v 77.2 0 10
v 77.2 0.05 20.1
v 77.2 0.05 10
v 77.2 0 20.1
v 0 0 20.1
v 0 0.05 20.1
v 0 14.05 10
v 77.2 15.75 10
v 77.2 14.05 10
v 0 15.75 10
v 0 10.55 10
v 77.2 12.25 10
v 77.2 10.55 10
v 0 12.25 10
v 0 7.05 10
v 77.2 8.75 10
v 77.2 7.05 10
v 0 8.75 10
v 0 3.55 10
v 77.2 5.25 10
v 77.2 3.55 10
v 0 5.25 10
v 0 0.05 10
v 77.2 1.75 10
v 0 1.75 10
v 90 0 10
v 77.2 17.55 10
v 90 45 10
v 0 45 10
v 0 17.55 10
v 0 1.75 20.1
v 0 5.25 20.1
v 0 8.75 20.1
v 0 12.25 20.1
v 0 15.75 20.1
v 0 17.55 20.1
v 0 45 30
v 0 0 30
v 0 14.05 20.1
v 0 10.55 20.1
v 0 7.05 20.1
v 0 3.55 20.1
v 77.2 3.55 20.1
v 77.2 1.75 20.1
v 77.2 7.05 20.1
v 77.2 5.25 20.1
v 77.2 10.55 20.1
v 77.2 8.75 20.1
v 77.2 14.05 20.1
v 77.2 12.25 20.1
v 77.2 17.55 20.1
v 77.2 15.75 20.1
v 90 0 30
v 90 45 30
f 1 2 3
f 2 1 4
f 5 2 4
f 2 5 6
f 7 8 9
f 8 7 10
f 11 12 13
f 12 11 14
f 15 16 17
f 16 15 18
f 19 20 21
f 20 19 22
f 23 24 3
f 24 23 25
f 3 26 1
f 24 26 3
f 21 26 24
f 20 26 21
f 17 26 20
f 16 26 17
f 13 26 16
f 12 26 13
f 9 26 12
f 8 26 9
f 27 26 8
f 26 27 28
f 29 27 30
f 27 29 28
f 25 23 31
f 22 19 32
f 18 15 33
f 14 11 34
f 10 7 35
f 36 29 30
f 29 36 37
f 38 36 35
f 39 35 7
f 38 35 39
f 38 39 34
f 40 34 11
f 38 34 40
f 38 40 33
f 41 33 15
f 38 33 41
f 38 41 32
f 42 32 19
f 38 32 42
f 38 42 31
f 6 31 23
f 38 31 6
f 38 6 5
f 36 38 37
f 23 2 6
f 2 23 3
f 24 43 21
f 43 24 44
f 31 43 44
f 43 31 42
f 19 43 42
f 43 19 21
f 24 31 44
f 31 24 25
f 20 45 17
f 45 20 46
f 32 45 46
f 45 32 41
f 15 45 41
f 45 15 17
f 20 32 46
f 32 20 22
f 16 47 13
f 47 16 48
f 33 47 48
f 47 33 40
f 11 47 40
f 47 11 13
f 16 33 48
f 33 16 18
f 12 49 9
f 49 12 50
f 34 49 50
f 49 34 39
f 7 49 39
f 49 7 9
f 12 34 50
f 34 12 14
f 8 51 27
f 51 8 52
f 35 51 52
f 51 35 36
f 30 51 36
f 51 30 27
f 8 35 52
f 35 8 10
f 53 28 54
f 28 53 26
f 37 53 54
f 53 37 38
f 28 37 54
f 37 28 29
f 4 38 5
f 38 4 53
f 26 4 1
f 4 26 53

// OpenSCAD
// Drying Rack for 10 Microscope Slides
// Base: 90 x 45 x 20 mm
// Slots: 10 parallel slots along X, 77mm long, 1.6mm wide, 10mm deep
// Spacing: 3.5mm centre-to-centre in Y
// Orientation: Rests on XY plane at Z=0

$fn = 128;

// Base Dimensions
base_length = 90;  // X
base_width = 45;   // Y
base_height = 20;  // Z

// Slot Dimensions
num_slots = 10;
slot_length = 77;  // X (runs along length)
slot_width = 1.6;  // Y
slot_depth = 10;   // Z

// Spacing
slot_spacing = 3.5; // Centre-to-centre in Y

// Calculation for Y positioning
// The group of slots is centred on the block in Y.
// Total span of slots = (num_slots - 1) * slot_spacing + num_slots * slot_width
// = 9 * 3.5 + 10 * 1.6 = 31.5 + 16.0 = 47.5 mm.
// Since the block is 45mm wide, the slots will overhang the sides, but the centers align.
// Distance from block center (0) to the center of the first slot:
// y_offset_first = ( (num_slots - 1) * slot_spacing ) / 2
y_offset_first = ((num_slots - 1) * slot_spacing) / 2;

difference() {
    // 1. Define the Base Block
    // We translate it up by base_height/2 so it sits on Z=0
    translate([0, 0, base_height / 2]) {
        cube([base_length, base_width, base_height]);
    }
    
    // 2. Cut the Slots
    for (i = [0 : num_slots - 1]) {
        // Calculate Y position for this slot center
        y_pos = -y_offset_first + (i * slot_spacing);
        
        // Define the cutting volume
        // The slot runs along X (length slot_length)
        // It is located at Y = y_pos with width slot_width
        // It goes down Z from the top (base_height) by slot_depth
        
        // To ensure clean cuts, we extend slightly past the faces
        // X: extend 0.1mm past the ends of the slot
        // Y: extend 0.1mm past the sides of the slot
        // Z: extend 0.1mm past the bottom of the cut
        
        slot_clearance_x = 0.1;
        slot_clearance_y = 0.1;
        slot_clearance_z = 0.1;
        
        // Position the cutter:
        // X: 0 (centered)
        // Y: y_pos
        // Z: base_height - slot_depth (bottom of the cut)
        translate([0, y_pos, base_height - slot_depth]) {
            cube([
                slot_length + 2 * slot_clearance_x,
                slot_width + 2 * slot_clearance_y,
                slot_depth + slot_clearance_z
            ]);
        }
    }
}
